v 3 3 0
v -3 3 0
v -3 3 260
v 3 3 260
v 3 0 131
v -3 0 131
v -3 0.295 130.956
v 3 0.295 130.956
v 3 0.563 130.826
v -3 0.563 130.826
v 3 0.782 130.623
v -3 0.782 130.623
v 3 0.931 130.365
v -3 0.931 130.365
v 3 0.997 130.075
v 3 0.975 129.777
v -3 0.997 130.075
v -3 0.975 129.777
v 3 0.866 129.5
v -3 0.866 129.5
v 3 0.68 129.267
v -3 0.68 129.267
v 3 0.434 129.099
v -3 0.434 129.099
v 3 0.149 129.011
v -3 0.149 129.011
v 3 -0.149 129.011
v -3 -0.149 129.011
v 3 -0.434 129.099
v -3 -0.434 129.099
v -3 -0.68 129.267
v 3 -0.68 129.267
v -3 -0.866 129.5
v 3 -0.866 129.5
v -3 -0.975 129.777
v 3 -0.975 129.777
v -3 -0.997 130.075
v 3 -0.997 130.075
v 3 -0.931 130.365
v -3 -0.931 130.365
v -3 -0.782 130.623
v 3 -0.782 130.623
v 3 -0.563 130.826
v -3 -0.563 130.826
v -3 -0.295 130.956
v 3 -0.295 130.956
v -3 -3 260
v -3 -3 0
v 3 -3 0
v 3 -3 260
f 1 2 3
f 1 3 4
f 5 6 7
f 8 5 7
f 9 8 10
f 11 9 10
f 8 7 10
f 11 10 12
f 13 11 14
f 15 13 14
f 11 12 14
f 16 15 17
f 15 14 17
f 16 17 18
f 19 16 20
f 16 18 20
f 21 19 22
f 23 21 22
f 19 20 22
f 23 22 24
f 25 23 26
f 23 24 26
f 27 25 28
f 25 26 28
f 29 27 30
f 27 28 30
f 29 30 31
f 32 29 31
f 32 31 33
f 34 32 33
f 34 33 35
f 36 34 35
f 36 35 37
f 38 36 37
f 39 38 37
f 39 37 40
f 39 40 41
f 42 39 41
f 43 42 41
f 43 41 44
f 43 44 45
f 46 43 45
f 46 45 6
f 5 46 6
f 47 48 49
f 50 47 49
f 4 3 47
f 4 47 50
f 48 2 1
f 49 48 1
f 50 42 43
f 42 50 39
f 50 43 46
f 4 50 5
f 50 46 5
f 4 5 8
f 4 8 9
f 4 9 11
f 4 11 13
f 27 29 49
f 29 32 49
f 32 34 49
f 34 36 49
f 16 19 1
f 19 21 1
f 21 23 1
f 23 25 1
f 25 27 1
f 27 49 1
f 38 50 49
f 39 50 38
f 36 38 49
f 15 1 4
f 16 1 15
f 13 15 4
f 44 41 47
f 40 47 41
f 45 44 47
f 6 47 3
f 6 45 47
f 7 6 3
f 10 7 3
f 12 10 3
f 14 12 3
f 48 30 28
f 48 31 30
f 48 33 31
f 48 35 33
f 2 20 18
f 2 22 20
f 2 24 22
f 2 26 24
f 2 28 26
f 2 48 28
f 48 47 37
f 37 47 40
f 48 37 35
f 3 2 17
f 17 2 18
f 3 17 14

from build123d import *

# Parameters (mm, degrees)
ESBO_O1_W                = 6
ESBO_O1_H                = 6
RESSALTO_EXTRUS_O1_DEPTH = 260
ESBO_O2_R                = 1
CORTE_EXTRUS_O1_DEPTH    = 10


with BuildPart() as part:
    # Esboço1 → Ressalto-extrusão1 (new body)
    with BuildSketch(Plane.XY):
        Rectangle(ESBO_O1_W, ESBO_O1_H)
    extrude(amount=RESSALTO_EXTRUS_O1_DEPTH)

    # Esboço2 → Corte-extrusão1 (cut)
    with BuildSketch(Plane.ZY.offset(3)):
        with Locations((130, 0)):
            Circle(ESBO_O2_R)
    extrude(amount=-CORTE_EXTRUS_O1_DEPTH, mode=Mode.SUBTRACT)


solid = part.part
